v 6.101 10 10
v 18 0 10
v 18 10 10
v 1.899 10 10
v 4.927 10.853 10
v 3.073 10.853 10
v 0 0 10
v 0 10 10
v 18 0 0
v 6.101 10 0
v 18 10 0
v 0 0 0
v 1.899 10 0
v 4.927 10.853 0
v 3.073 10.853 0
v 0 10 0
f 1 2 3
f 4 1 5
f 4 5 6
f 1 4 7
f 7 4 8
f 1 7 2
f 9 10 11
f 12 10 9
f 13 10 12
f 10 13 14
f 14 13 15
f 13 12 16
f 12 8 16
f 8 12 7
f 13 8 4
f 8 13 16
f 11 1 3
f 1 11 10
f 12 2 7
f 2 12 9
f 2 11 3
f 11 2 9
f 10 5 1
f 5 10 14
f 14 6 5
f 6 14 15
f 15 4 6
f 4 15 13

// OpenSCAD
// Union of multiple shapes
union() {
    cube([10, 10, 10]);
    translate([8, 0, 0])
        cube([10, 10, 10]);
    translate([4, 8, 0])
        cylinder(h=10, r=3);
}
